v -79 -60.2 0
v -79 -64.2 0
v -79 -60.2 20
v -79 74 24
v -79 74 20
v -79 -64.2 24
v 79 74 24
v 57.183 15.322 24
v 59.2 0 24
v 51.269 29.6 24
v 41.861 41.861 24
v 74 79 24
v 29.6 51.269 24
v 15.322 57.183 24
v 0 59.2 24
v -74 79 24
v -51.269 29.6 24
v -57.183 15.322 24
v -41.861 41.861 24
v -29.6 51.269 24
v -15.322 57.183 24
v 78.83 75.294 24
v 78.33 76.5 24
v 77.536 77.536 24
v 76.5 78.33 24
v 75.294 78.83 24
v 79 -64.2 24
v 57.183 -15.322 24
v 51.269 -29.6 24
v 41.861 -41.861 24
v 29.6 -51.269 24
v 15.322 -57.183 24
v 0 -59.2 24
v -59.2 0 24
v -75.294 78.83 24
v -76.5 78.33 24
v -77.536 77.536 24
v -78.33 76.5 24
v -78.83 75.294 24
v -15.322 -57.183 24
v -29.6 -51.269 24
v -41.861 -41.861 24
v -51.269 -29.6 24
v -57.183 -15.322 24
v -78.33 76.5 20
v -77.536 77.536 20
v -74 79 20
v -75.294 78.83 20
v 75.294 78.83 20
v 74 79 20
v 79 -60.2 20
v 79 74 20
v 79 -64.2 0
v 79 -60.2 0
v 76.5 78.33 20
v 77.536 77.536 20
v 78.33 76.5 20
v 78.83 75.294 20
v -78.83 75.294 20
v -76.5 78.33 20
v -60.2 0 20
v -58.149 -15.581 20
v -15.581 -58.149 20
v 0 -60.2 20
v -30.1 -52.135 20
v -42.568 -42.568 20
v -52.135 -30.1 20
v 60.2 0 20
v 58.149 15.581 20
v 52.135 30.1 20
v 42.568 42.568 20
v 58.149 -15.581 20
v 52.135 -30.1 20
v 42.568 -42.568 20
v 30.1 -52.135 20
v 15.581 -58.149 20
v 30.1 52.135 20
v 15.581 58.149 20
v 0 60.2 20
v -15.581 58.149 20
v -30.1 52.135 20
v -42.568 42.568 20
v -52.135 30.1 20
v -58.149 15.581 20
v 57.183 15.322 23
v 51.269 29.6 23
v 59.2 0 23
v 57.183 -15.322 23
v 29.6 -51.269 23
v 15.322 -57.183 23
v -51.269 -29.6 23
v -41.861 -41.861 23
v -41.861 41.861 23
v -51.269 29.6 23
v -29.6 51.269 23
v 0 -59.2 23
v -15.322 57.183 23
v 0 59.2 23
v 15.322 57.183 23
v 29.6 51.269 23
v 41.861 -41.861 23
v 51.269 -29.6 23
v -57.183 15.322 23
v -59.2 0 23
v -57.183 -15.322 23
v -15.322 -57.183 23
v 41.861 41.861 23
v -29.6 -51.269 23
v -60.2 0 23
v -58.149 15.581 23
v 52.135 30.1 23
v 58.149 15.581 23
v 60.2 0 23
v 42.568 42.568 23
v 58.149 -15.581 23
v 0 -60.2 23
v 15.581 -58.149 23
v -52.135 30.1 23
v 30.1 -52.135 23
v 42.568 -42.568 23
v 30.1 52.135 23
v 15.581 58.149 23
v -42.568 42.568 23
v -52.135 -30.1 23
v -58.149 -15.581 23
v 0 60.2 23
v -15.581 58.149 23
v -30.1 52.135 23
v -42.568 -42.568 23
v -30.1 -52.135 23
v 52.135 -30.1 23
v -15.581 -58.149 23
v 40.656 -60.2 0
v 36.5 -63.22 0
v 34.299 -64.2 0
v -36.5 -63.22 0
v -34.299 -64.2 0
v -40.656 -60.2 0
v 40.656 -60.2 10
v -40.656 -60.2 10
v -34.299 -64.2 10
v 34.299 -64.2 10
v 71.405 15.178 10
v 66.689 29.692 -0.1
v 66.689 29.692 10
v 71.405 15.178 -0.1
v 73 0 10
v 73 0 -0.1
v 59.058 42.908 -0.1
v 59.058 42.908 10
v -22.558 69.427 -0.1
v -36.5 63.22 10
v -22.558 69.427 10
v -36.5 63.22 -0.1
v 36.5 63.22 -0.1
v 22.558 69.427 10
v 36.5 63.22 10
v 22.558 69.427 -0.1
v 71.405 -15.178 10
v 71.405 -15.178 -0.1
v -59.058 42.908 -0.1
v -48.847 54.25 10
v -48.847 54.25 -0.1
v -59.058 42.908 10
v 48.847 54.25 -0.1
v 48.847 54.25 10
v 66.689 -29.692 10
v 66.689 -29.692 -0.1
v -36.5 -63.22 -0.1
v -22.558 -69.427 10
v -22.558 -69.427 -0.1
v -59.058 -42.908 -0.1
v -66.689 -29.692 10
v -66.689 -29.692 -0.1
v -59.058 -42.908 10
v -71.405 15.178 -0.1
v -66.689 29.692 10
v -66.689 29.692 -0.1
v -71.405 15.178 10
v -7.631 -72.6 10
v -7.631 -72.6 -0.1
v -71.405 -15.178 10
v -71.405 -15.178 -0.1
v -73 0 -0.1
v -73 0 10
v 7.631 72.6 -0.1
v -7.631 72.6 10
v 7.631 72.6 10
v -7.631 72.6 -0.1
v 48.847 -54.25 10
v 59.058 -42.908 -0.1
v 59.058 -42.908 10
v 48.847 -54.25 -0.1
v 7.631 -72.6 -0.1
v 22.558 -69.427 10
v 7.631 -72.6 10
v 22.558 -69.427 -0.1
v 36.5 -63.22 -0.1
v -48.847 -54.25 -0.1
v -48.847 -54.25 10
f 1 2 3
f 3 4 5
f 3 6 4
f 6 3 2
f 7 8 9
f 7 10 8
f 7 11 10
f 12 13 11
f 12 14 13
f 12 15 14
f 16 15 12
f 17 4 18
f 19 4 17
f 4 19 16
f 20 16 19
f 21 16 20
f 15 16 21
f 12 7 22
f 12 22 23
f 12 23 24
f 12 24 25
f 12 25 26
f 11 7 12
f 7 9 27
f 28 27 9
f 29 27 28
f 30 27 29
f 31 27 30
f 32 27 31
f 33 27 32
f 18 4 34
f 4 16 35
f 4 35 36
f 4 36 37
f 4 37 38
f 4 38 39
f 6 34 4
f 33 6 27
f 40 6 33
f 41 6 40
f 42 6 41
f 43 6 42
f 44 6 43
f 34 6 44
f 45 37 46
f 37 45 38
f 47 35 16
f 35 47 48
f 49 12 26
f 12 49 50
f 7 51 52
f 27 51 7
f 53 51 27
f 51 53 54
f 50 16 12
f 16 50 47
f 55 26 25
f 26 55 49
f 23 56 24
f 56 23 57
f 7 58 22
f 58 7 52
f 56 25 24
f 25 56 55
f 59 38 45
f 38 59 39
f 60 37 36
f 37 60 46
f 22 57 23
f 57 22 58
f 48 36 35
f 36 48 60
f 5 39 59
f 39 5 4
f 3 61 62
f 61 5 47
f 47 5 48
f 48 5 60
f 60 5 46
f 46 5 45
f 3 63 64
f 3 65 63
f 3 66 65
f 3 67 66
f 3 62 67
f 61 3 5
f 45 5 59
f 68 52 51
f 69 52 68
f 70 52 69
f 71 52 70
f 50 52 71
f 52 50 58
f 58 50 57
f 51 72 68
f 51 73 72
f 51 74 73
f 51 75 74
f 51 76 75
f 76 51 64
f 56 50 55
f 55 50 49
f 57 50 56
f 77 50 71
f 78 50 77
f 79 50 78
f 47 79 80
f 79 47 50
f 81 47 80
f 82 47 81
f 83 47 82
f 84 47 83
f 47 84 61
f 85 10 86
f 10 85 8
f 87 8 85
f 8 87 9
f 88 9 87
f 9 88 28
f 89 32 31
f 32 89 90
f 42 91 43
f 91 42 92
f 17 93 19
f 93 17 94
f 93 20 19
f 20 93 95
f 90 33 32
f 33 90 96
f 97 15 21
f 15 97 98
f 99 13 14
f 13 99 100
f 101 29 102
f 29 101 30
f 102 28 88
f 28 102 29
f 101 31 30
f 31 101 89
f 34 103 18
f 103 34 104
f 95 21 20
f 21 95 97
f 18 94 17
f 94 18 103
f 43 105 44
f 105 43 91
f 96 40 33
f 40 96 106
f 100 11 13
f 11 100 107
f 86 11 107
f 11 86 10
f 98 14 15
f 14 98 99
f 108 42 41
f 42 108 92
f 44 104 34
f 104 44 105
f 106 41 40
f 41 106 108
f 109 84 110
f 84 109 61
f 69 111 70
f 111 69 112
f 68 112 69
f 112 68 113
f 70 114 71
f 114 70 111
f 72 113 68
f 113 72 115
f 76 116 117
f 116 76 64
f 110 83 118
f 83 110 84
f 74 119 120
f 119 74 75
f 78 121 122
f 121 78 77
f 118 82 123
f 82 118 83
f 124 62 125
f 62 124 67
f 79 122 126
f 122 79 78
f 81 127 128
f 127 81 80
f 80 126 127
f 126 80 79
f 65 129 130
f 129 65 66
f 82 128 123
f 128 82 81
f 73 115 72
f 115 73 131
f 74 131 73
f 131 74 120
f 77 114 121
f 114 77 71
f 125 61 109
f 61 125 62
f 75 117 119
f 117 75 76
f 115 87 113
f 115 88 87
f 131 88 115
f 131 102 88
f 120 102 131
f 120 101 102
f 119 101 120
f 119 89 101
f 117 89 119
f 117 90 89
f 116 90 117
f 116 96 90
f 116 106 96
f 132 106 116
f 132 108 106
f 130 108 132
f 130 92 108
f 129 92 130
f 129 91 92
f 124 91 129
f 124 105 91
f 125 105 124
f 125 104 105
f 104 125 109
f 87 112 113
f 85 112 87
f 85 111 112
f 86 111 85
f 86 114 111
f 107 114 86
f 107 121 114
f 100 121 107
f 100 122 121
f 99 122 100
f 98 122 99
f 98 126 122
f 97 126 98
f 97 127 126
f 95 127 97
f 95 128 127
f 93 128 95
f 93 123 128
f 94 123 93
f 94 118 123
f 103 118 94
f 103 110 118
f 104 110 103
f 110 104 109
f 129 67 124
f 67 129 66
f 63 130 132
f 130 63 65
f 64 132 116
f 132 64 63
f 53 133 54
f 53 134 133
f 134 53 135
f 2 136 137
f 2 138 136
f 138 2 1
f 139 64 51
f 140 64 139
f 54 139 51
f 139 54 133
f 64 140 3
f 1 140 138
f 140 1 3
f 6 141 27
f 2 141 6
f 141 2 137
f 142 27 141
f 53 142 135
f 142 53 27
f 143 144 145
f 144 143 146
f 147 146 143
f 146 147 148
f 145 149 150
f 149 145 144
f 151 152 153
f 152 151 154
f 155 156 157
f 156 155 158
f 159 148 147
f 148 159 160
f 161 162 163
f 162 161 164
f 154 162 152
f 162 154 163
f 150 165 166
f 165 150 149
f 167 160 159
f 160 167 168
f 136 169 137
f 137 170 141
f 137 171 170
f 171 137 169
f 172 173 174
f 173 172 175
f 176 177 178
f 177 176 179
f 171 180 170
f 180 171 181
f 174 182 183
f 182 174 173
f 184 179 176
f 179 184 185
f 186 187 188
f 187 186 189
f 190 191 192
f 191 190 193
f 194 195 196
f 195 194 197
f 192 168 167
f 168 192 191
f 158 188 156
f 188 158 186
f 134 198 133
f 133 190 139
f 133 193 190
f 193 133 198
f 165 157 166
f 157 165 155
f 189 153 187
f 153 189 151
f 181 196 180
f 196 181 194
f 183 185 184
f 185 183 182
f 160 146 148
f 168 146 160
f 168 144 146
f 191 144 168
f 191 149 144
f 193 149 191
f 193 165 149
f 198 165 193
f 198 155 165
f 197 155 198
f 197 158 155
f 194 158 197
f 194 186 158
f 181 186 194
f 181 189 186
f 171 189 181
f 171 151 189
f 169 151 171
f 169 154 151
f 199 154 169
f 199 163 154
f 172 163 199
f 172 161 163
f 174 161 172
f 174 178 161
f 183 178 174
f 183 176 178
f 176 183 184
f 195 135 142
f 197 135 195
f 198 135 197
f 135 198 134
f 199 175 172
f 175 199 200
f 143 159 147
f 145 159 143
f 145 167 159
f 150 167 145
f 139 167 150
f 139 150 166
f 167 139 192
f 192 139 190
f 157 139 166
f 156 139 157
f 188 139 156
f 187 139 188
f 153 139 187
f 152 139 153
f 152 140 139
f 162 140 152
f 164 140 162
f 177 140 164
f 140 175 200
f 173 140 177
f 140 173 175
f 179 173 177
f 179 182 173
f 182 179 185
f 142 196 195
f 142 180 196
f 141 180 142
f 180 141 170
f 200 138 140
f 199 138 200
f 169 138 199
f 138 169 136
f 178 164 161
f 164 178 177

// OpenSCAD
// file: ../OpenSCAD_Modules/cube_vround.scad
module cube_vround(
	size=[10,10,10],
	round_corners=[true,true,true,true],
	rounding=3,
	center_xy=false,
	center_z=false,
	attach=0,
	wall_attach=0,
	quality=2, //integer from 1 to infinity
)
{
	assert(len(size)==3);
	assert(len(round_corners)==4);
	assert(rounding>0);
	assert(rounding<=size[0]/2);
	assert(rounding<=size[1]/2);
	assert(quality>0);
	assert(attach>=0);
	assert(wall_attach>=0);
	height=size[2]+attach;
	cyl_r=rounding+wall_attach;
	cyl_mvx=size[0]/2-rounding;
	cyl_mvy=size[1]/2-rounding;
	cube_szx=size[0]/2;
	cube_szy=size[1]/2;
	cube_mvx=cube_szx/2+wall_attach;
	cube_mvy=cube_szy/2+wall_attach;
	translate([center_xy?0:cube_szx,center_xy?0:cube_szy,center_z?-attach/2:(size[2]-attach)/2])
		hull()
		{
			if(round_corners[0])
				translate([cyl_mvx,cyl_mvy])
					cylinder(r=cyl_r,h=height,$fn=12*quality,center=true);
			else
				translate([cube_mvx,cube_mvy])
					cube([cube_szx,cube_szy,height],center=true);
			if(round_corners[1])
				translate([cyl_mvx,-cyl_mvy])
					cylinder(r=cyl_r,h=height,$fn=12*quality,center=true);
			else
				translate([cube_mvx,-cube_mvy])
					cube([cube_szx,cube_szy,height],center=true);
			if(round_corners[2])
				translate([-cyl_mvx,-cyl_mvy])
					cylinder(r=cyl_r,h=height,$fn=12*quality,center=true);
			else
				translate([-cube_mvx,-cube_mvy])
					cube([cube_szx,cube_szy,height],center=true);
			if(round_corners[3])
				translate([-cyl_mvx,cyl_mvy])
					cylinder(r=cyl_r,h=height,$fn=12*quality,center=true);
			else
				translate([-cube_mvx,cube_mvy])
					cube([cube_szx,cube_szy,height],center=true);
		};
}

//example
cube_vround(round_corners=[true,false,true,false],
size=[10,20,6],
attach=0.1,
wall_attach=0.1,
rounding=3,
center_xy=true,center_z=false);
// main file
use <../OpenSCAD_Modules/cube_vround.scad>

module Divider1
(
	size=[160,160],
	wallSize=2,
	baseDiam=[120,118,4,1],
	baseElevation=20,
	baseCutHeight=10,
	cutDiam=146,
	wallSize=2,
	edgeClr=0.2,
	quality=2,
)
{
	cutClr=0.1;
	baseSize=[size[0]-wallSize,size[1]-wallSize];
	baseCutSz=(baseSize[1]-baseDiam[0])/2;
	
	union()
	{
		translate([0,0,baseElevation])
		difference()
		{
			translate([0,(baseCutSz-edgeClr-cutClr)/2,0])
			cube_vround(size=[baseSize[0],baseSize[1]-baseCutSz+edgeClr+cutClr,baseDiam[2]],center_xy=true,rounding=5,round_corners=[true,false,false,true],quality=quality);
			translate([0,0,-cutClr])
				cylinder(d=baseDiam[1]+2*edgeClr,h=baseDiam[2]+2*cutClr,$fn=12*quality);
			translate([0,0,-2*cutClr])
				cylinder(d=baseDiam[0]+2*edgeClr,h=baseDiam[2]-baseDiam[3]+2*cutClr,$fn=12*quality);
		}
		translate([0,-(baseDiam[2]+baseDiam[0])/2-edgeClr,(baseElevation+baseDiam[2])/2])
		cube(size=[baseSize[0],baseDiam[2],baseElevation+baseDiam[2]],center=true);
	}


	//cutHole
	translate([0,0,-cutClr])
		cylinder(d=cutDiam,h=baseCutHeight+cutClr);
}

Divider1();
